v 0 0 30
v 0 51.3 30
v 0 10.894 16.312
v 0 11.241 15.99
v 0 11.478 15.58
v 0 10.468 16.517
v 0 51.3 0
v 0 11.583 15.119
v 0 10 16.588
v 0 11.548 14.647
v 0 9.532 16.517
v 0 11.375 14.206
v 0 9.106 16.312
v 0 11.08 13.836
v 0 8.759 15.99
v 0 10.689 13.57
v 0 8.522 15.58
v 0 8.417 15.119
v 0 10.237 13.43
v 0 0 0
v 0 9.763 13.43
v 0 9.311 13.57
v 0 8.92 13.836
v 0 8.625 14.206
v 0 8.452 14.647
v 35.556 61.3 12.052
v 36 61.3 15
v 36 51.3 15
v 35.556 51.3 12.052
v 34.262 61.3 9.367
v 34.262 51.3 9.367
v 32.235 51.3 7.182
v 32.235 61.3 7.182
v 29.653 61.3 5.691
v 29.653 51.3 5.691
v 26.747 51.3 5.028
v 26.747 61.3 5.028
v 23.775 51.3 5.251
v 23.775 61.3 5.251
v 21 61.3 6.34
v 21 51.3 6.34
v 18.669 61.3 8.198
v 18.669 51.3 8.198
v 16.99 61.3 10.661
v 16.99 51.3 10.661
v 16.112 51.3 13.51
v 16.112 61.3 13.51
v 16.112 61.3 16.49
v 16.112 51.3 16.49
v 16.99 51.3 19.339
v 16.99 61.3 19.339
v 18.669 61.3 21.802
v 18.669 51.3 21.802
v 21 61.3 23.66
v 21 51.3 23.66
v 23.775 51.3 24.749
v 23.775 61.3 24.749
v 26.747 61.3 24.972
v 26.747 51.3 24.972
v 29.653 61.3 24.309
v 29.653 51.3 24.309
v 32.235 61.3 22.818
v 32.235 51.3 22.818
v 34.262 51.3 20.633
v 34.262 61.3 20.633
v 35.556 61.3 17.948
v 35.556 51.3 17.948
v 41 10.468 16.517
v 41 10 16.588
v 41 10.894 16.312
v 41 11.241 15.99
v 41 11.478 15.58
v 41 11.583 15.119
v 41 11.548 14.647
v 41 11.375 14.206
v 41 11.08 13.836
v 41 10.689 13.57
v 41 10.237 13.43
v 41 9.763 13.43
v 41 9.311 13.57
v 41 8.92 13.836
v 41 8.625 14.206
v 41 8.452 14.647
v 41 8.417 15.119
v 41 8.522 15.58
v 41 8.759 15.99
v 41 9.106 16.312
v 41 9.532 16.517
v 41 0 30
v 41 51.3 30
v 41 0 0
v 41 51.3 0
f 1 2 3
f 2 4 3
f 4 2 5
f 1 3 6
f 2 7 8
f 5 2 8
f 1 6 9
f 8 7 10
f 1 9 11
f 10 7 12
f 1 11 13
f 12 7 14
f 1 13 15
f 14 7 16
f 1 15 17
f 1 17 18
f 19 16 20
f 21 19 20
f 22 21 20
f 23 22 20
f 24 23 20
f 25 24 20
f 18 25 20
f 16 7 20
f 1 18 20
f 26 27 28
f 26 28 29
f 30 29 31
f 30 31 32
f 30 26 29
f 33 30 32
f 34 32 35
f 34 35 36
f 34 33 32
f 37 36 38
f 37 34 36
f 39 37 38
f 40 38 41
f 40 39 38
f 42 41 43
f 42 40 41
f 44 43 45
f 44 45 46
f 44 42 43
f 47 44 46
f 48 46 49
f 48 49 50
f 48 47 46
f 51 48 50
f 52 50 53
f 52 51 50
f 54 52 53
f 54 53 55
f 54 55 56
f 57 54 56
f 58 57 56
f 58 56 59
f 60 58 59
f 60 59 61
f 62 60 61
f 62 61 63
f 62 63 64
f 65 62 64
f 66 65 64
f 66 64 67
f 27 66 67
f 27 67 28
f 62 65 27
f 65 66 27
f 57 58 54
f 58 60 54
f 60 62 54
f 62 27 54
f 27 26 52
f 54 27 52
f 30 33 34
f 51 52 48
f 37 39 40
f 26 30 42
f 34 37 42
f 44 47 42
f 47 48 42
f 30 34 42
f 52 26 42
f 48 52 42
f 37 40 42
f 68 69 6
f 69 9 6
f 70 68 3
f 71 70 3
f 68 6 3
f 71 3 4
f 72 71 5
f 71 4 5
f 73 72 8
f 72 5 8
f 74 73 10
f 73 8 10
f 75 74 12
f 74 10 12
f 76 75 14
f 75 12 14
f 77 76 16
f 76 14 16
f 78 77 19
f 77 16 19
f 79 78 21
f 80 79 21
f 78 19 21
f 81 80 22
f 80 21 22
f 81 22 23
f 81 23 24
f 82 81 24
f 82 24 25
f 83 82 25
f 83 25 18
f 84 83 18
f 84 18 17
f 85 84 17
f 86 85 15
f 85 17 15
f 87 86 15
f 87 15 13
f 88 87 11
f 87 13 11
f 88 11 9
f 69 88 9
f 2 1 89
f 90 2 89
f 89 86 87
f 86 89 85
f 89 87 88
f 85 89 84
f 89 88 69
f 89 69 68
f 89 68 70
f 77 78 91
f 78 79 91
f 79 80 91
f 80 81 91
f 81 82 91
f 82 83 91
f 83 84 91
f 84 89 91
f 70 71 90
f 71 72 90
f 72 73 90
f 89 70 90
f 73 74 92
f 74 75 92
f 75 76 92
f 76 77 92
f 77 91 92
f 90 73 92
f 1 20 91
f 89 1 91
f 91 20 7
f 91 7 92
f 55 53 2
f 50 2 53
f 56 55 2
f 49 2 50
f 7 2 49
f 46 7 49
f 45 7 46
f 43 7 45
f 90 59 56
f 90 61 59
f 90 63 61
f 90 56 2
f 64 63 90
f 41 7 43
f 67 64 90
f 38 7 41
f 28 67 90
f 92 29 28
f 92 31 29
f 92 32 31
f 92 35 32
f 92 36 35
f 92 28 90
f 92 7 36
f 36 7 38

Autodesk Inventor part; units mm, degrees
ref_plane "YZ Plane" through (0, 0, 0) normal (1, 0, 0) x (0, 1, 0)
ref_plane "XZ Plane" through (0, 0, 0) normal (0, 1, 0) x (-1, 0, 0)
ref_plane "XY Plane" through (0, 0, 0) normal (0, 0, 1) x (1, 0, 0)
sketch "Sketch1" plane through (0, 0, 0) normal (0, 0, 1) x (1, 0, 0)
  line L0 (0, 0) -> (41, 0)
  line L1 (41, 0) -> (41, 61.3)
  line L2 (41, 61.3) -> (0, 61.3)
  line L3 (0, 61.3) -> (0, 0)
  dimension "d0" = 61.3
  dimension "d1" = 41
extrude "Extrusion1" add sketch "Sketch1" along normal blind 30
sketch "Sketch2" plane through (0, 0, 0) normal (-1, 0, 0) x (0, 0, 1)
  circle A0 centre (15, 10) radius 1.5875
  line L0 (0, 0) -> (30, 0) projected
  line L1 (0, 61.3) -> (0, 0) projected
  dimension "d4" = 3.175
  dimension "d5" = 10
  dimension "d6" = 15
extrude "Extrusion2" cut sketch "Sketch2" against normal through all
sketch "Sketch3" plane through (0, 61.3, 0) normal (0, 1, 0) x (1, 0, 0)
  line L0 (0, 0) -> (0, -30) projected
  line L1 (41, 0) -> (41, -30) projected
  line L2 (0, 0) -> (41, 0)
  line L3 (41, 0) -> (41, -30)
  line L4 (41, -30) -> (0, -30)
  line L5 (0, -30) -> (0, 0)
  circle A0 centre (26, -15) radius 10
  dimension "d9" = 15
  dimension "d10" = 15
  dimension "d11" = 20
extrude "Extrusion3" cut sketch "Sketch3" against normal blind 10
properties part number "SolidnoidV"
